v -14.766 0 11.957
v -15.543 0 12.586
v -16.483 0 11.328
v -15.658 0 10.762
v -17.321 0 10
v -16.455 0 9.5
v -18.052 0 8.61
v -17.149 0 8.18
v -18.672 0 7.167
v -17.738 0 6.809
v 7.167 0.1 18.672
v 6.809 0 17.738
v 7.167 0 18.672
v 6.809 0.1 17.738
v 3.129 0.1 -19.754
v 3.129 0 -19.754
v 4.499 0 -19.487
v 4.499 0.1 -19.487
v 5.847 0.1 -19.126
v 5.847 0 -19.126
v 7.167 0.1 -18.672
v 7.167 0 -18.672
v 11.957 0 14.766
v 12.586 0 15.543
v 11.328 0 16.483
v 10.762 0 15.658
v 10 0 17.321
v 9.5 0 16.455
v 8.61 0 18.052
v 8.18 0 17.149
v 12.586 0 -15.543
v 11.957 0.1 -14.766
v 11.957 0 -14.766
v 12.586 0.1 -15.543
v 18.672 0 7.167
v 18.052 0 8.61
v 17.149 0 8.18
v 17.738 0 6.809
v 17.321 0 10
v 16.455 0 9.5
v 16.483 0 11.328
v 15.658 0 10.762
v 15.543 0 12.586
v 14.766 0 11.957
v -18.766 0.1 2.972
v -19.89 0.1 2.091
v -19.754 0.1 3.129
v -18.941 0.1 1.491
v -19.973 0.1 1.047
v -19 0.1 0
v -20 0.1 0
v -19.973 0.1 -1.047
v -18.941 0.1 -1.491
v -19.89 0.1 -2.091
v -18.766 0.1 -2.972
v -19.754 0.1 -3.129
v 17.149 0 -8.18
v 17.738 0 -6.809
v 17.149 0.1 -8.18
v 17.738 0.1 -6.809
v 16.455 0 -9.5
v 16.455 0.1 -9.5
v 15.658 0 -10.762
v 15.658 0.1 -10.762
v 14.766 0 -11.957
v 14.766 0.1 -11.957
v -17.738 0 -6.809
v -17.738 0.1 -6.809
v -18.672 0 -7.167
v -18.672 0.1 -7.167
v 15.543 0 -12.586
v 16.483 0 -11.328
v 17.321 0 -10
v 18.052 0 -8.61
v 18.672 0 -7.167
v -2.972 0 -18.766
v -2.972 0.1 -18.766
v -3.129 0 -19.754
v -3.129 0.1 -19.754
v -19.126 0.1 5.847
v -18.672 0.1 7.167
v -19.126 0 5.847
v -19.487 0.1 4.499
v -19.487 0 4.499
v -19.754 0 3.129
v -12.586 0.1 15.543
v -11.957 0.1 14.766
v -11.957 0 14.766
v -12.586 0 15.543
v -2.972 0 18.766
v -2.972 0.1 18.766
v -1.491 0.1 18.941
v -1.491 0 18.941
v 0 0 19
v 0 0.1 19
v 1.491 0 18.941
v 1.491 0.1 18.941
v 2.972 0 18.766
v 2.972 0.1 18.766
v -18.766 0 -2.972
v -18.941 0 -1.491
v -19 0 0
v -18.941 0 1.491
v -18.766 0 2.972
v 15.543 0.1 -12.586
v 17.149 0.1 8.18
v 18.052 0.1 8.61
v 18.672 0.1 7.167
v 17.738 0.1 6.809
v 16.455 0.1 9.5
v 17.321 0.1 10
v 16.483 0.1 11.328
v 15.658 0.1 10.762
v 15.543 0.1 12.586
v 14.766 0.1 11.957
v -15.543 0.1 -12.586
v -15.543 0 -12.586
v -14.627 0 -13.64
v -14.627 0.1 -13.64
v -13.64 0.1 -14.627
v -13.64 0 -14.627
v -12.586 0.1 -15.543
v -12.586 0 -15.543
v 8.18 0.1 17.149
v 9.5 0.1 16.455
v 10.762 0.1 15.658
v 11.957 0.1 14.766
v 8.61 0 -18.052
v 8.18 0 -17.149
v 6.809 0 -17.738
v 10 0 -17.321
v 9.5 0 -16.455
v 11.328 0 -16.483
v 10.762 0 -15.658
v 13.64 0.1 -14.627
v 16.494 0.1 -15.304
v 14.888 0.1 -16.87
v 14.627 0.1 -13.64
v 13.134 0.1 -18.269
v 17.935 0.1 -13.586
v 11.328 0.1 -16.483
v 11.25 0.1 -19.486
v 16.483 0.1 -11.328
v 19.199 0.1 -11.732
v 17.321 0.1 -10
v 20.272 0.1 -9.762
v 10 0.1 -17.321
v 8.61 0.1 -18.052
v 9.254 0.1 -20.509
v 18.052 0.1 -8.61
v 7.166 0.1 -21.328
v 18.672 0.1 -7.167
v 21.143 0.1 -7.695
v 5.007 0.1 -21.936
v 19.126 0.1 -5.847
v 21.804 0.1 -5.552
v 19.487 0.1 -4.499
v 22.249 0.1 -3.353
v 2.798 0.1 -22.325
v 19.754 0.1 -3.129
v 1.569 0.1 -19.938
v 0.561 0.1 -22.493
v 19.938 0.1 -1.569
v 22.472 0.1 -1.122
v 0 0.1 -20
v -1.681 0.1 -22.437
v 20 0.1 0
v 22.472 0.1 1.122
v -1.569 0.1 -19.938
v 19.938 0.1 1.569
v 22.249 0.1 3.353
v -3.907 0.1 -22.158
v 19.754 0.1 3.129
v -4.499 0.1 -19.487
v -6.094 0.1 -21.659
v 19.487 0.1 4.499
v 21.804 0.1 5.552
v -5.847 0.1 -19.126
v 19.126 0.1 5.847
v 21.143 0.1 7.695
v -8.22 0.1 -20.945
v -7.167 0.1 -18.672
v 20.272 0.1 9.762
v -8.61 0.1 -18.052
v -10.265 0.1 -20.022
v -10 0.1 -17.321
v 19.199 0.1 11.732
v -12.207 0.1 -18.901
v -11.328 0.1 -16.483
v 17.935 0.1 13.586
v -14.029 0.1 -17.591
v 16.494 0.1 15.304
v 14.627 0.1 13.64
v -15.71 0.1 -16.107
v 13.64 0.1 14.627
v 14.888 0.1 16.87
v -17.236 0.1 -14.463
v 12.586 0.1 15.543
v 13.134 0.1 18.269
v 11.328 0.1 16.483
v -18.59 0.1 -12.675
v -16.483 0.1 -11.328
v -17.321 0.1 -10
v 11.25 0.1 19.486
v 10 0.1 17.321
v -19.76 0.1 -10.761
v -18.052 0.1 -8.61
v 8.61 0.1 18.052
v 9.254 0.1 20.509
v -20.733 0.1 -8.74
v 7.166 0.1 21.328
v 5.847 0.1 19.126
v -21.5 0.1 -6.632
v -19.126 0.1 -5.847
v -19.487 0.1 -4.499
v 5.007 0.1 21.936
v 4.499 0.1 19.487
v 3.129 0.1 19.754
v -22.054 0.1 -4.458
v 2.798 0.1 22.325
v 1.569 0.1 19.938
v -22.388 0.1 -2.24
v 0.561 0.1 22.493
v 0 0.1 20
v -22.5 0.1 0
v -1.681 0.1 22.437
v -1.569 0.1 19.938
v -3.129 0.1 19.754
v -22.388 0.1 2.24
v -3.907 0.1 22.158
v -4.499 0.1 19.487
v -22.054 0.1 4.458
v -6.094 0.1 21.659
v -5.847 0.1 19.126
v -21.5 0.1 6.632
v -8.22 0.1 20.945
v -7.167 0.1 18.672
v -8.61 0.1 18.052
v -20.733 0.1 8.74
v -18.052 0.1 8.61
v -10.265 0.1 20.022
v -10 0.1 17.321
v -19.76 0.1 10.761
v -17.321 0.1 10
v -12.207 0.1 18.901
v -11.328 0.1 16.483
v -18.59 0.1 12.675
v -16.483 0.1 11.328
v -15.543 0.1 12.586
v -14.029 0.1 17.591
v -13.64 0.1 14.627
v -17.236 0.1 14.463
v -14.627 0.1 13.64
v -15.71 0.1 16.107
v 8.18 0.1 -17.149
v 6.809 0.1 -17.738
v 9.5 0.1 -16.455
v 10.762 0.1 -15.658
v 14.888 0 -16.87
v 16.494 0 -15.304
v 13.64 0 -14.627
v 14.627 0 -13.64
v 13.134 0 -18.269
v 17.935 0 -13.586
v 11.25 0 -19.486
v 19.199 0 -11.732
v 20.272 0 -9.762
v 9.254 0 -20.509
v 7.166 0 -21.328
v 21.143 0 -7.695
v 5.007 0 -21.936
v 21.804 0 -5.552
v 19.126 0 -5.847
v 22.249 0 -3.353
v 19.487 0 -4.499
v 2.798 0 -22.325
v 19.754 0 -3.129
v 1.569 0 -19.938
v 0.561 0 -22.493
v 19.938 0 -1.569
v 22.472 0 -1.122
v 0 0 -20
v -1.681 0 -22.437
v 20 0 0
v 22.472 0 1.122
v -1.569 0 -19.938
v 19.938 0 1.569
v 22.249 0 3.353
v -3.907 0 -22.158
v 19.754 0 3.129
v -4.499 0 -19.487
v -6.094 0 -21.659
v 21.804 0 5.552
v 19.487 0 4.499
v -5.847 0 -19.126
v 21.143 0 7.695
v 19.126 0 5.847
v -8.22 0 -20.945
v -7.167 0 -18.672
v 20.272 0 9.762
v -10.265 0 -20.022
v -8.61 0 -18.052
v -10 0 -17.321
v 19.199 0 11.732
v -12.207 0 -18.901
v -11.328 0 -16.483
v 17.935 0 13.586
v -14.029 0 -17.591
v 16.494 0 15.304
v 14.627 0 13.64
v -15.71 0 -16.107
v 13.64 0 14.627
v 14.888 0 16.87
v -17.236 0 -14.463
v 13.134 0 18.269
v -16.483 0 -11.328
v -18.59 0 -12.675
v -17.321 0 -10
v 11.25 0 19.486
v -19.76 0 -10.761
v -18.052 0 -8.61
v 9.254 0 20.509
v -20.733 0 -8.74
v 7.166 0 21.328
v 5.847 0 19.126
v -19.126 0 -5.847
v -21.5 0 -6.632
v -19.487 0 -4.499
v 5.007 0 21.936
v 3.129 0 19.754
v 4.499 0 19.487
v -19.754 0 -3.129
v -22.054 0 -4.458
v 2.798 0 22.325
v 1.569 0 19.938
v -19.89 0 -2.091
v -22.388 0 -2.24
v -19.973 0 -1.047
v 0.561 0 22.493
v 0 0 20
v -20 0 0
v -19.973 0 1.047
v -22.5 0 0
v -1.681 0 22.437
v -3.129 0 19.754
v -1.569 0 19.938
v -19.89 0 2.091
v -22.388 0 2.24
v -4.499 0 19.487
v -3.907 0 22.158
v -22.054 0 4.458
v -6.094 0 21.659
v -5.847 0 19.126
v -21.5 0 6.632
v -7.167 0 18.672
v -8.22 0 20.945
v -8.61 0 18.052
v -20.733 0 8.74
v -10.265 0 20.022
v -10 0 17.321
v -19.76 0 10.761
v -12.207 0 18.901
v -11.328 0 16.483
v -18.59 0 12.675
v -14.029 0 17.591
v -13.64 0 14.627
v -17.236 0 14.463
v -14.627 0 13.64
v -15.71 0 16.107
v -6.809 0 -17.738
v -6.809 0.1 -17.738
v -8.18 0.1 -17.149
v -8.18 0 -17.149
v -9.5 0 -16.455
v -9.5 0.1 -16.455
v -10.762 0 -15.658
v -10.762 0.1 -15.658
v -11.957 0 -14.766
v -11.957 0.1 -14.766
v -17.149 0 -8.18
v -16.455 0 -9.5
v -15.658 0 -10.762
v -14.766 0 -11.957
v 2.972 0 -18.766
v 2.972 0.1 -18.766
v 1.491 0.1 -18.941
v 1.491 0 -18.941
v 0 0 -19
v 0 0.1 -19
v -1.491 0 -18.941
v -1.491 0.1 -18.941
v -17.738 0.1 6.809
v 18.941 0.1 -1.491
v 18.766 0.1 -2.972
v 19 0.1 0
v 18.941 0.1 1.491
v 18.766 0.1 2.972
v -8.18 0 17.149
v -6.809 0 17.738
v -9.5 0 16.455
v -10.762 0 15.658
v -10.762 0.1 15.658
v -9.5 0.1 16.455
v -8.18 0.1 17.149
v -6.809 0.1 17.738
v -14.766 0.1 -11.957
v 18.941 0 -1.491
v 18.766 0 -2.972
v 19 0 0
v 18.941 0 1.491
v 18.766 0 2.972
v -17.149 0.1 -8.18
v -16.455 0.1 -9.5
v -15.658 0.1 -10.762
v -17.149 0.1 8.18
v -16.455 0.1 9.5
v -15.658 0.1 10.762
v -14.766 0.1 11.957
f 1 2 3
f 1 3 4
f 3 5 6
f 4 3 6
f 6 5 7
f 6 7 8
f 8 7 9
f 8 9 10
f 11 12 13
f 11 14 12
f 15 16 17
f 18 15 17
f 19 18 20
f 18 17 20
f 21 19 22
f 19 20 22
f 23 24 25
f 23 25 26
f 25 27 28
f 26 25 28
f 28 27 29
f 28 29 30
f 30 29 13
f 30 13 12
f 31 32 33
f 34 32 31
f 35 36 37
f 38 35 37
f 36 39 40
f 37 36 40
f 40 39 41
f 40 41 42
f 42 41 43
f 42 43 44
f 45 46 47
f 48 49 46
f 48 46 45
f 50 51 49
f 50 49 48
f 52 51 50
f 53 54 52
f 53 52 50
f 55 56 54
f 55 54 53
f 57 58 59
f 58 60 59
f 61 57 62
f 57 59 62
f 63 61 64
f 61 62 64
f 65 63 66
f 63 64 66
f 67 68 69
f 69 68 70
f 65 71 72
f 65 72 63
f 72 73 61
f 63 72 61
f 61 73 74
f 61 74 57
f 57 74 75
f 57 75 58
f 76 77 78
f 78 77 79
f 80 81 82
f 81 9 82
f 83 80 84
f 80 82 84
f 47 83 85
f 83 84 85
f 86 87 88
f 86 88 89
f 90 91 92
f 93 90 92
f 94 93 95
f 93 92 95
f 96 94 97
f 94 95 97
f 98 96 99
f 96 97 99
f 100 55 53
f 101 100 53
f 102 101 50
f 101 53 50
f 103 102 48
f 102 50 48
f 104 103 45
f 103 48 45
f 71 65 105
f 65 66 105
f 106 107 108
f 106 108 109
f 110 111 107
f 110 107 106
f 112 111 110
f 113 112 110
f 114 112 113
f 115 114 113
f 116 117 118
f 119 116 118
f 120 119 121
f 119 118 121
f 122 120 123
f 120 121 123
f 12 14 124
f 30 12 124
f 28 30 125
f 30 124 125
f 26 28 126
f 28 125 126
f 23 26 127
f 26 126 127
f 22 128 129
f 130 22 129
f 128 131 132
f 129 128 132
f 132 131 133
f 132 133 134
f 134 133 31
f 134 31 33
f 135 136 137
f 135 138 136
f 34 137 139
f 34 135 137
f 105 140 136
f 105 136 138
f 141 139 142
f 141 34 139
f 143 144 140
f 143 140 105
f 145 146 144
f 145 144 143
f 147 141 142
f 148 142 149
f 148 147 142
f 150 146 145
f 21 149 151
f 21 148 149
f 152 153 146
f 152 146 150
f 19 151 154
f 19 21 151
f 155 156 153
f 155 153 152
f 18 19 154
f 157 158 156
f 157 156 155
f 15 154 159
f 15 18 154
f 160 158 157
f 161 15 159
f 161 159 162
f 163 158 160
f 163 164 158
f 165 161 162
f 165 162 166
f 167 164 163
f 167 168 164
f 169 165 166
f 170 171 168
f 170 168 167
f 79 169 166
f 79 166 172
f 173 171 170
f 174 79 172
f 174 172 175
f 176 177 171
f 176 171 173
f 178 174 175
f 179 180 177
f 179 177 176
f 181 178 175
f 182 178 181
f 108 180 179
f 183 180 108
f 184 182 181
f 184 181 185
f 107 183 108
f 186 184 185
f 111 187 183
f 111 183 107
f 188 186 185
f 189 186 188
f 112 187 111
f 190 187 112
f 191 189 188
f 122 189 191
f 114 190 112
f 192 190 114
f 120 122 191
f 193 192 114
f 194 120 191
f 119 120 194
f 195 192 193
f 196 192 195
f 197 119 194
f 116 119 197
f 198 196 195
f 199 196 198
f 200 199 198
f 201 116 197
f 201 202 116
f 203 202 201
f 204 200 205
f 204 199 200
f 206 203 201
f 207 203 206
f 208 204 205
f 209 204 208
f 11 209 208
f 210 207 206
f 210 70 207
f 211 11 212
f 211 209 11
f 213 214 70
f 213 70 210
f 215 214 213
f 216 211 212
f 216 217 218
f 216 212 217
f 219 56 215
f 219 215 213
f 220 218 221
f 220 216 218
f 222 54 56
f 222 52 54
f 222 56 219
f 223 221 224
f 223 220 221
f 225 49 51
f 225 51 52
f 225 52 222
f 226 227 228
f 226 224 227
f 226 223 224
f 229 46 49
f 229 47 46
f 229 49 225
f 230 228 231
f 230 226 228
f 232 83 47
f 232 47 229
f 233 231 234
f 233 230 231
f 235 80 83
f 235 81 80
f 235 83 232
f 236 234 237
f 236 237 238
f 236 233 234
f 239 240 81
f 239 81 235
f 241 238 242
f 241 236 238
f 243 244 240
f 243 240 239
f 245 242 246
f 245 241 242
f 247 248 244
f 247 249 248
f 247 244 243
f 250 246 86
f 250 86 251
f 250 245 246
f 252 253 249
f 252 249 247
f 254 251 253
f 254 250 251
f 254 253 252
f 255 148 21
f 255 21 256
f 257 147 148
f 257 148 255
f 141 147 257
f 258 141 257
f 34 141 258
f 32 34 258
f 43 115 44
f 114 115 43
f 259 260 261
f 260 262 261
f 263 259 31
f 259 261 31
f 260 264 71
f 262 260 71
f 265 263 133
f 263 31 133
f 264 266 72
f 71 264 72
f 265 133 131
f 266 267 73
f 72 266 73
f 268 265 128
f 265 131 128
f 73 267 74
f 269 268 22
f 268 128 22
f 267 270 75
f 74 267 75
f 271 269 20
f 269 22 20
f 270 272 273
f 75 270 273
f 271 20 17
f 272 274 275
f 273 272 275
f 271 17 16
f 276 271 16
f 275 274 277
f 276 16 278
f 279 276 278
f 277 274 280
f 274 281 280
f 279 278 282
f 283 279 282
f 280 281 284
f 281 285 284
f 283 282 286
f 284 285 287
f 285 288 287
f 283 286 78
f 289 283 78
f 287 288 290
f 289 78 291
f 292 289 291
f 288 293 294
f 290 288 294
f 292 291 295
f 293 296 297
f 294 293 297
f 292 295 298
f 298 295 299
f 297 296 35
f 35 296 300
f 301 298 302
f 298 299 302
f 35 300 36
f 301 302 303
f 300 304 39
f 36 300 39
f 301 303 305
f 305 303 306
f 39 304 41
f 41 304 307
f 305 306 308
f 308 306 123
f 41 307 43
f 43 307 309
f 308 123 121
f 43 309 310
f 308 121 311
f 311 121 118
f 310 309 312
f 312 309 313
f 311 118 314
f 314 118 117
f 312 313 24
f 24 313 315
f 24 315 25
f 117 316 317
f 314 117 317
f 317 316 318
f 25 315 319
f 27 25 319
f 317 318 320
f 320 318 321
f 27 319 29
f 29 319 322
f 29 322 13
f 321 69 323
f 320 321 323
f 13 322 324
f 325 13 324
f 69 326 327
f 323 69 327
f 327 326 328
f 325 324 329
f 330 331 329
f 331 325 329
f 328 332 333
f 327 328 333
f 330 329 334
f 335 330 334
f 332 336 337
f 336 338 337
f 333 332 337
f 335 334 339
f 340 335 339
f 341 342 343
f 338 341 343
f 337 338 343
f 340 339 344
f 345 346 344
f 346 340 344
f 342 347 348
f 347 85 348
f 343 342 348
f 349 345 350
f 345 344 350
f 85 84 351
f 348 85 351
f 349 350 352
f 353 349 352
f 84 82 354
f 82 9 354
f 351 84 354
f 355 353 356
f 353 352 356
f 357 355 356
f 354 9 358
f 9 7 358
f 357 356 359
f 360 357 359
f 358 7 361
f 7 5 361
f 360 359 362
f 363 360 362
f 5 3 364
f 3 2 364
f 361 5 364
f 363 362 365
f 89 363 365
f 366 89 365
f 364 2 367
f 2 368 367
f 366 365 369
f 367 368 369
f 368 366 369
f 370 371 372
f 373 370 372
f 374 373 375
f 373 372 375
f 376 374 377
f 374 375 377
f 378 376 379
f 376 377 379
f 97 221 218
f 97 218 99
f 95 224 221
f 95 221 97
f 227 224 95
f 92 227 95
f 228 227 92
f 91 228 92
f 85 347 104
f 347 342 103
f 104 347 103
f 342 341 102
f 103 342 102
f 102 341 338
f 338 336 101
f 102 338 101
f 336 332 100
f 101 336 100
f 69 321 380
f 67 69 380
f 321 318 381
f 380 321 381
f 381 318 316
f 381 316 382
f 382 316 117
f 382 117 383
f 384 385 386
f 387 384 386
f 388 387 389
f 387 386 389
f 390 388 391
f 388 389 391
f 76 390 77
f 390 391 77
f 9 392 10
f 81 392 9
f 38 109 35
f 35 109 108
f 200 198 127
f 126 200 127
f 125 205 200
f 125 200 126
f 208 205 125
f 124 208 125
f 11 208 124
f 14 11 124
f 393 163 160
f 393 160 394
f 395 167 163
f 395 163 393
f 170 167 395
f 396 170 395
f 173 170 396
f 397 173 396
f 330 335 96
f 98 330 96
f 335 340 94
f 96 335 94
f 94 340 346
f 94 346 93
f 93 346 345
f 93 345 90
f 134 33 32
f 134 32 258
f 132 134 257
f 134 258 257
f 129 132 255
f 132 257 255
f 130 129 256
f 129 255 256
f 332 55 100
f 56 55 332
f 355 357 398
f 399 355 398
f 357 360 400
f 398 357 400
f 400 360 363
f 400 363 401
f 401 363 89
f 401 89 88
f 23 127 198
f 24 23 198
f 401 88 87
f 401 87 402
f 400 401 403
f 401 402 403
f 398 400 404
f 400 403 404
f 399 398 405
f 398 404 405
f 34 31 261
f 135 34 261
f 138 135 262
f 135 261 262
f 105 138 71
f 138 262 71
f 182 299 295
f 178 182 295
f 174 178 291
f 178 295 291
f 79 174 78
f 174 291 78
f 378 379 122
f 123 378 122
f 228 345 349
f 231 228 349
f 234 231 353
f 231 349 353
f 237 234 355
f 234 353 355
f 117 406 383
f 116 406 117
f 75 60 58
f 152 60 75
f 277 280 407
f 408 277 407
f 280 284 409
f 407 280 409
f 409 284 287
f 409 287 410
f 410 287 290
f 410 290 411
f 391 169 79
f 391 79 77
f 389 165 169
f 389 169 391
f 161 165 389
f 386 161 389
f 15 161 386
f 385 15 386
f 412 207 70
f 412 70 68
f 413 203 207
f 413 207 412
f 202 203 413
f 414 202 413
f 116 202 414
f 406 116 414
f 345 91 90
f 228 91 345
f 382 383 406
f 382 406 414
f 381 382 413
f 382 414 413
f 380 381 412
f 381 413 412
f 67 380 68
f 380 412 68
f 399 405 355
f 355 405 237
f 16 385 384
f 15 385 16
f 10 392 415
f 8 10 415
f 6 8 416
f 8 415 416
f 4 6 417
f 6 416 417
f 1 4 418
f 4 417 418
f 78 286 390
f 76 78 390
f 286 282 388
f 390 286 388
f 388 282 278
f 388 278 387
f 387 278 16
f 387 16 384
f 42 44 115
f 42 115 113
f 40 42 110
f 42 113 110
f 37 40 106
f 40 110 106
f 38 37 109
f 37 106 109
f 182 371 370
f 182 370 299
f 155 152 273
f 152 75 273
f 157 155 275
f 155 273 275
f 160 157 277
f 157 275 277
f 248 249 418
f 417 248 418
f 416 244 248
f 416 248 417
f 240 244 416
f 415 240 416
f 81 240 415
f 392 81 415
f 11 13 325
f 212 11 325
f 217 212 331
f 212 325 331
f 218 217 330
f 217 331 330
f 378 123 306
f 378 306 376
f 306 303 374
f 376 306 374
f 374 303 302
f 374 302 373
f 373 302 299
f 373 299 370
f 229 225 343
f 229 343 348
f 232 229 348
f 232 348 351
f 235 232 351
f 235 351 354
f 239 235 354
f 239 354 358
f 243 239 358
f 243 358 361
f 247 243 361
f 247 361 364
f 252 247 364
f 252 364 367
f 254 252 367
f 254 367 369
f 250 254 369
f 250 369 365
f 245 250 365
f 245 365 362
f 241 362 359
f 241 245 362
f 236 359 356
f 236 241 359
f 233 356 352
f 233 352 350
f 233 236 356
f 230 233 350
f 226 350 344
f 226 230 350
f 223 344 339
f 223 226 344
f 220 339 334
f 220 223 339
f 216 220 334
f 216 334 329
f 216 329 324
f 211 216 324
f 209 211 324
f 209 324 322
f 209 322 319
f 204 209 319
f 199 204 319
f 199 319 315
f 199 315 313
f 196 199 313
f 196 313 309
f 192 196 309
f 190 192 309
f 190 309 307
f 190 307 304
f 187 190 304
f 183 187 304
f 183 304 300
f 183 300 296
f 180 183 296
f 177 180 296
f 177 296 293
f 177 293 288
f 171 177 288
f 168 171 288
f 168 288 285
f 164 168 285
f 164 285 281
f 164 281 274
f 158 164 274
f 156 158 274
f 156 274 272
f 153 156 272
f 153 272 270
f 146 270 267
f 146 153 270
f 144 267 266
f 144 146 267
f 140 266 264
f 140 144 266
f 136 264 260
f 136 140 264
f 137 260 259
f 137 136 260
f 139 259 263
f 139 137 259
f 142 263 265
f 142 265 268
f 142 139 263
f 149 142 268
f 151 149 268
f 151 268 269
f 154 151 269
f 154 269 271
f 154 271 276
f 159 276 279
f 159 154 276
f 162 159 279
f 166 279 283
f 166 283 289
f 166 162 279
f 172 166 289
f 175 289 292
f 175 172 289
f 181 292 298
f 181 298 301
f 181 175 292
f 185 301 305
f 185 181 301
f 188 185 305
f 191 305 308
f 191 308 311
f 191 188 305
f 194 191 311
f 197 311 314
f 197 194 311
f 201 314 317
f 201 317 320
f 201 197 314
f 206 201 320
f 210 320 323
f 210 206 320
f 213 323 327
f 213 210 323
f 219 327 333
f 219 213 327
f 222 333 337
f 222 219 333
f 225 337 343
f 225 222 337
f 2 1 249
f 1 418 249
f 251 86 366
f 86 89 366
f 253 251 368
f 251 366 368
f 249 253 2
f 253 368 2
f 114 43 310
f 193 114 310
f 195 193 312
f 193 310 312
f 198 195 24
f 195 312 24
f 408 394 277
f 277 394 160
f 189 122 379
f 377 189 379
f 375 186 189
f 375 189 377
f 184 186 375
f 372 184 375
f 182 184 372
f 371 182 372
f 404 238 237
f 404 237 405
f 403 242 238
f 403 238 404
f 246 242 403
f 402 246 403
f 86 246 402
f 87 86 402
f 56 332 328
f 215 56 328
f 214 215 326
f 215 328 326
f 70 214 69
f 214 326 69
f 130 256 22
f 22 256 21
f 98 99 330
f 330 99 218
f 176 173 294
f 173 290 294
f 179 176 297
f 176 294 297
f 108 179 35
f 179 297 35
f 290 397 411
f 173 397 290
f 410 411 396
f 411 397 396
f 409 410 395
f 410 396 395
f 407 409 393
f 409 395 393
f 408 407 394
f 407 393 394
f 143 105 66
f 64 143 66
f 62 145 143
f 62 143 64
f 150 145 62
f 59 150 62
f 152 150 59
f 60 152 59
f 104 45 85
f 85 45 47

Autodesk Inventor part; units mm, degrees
ref_plane "YZ Plane" through (0, 0, 0) normal (1, 0, 0) x (0, 1, 0)
ref_plane "XZ Plane" through (0, 0, 0) normal (0, 1, 0) x (-1, 0, 0)
ref_plane "XY Plane" through (0, 0, 0) normal (0, 0, 1) x (1, 0, 0)
sketch "Sketch1" plane through (0, 0, 0) normal (0, 0, 1) x (1, 0, 0)
  line L0 (-20, 0) -> (-22.5, 0)
  line L1 (-22.5, 0) -> (-22.5, 0.1)
  line L2 (-22.5, 0.1) -> (-20, 0.1)
  line L3 (-20, 0.1) -> (-20, 0)
  line L4 (0, -0.02) -> (0, 0.12) projected
  point P0 (0, 0)
  dimension "d0" = 20
  dimension "d1" = 22.5
  dimension "d2" = 0.1
revolve "Revolution1" add sketch "Sketch1" angle 360 about axis through (0, -10, 0) along (0, 1, 0)
sketch "Sketch2" plane through (0, 0.1, 0) normal (0, 1, 0) x (1, 0, 0)
  circle A0 centre (0, 0) radius 19 construction
  line L0 (0, 0) -> (-19.7538, 3.1287)
  line L1 (0, 0) -> (-19.7538, -3.1287)
  circle A1 centre (0, 0) radius 20 projected
  circle A2 centre (0, 0) radius 20 projected
  arc A3 (-18.7661, 2.9723) -> (-18.7661, -2.9723) centre (0, 0) ccw
  arc A4 (-19.7538, 3.1287) -> (-19.7538, -3.1287) centre (0, 0) ccw
  point P0 (-19.7538, 3.1287)
  dimension "d4" = 38
  dimension "d5" = 18
extrude "Extrusion1" add sketch "Sketch2" against normal up to surface (0.1 mm away) contours A3 L1 A1 L0
pattern_circular "Circular Pattern1" count 12 over 360 about axis through (0, 0.05, 0) along (0, 1, 0) of "Extrusion1"
properties part number "TorsionOscillator-IsolationRing" material "Paper"
